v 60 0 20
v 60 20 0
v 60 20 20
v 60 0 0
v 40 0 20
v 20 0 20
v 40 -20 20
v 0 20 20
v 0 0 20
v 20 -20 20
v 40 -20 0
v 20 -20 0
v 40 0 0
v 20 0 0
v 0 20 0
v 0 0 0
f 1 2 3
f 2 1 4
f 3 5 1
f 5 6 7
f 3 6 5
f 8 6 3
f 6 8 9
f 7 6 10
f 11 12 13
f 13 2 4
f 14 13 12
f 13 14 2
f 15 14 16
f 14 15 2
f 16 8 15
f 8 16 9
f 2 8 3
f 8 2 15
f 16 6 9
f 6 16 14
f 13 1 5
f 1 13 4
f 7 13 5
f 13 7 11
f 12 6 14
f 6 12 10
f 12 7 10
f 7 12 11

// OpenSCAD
module t_conn(){
  union(){ cube([60,20,20]); translate([20,-20,0]) cube([20,20,20]); }
}
t_conn();
